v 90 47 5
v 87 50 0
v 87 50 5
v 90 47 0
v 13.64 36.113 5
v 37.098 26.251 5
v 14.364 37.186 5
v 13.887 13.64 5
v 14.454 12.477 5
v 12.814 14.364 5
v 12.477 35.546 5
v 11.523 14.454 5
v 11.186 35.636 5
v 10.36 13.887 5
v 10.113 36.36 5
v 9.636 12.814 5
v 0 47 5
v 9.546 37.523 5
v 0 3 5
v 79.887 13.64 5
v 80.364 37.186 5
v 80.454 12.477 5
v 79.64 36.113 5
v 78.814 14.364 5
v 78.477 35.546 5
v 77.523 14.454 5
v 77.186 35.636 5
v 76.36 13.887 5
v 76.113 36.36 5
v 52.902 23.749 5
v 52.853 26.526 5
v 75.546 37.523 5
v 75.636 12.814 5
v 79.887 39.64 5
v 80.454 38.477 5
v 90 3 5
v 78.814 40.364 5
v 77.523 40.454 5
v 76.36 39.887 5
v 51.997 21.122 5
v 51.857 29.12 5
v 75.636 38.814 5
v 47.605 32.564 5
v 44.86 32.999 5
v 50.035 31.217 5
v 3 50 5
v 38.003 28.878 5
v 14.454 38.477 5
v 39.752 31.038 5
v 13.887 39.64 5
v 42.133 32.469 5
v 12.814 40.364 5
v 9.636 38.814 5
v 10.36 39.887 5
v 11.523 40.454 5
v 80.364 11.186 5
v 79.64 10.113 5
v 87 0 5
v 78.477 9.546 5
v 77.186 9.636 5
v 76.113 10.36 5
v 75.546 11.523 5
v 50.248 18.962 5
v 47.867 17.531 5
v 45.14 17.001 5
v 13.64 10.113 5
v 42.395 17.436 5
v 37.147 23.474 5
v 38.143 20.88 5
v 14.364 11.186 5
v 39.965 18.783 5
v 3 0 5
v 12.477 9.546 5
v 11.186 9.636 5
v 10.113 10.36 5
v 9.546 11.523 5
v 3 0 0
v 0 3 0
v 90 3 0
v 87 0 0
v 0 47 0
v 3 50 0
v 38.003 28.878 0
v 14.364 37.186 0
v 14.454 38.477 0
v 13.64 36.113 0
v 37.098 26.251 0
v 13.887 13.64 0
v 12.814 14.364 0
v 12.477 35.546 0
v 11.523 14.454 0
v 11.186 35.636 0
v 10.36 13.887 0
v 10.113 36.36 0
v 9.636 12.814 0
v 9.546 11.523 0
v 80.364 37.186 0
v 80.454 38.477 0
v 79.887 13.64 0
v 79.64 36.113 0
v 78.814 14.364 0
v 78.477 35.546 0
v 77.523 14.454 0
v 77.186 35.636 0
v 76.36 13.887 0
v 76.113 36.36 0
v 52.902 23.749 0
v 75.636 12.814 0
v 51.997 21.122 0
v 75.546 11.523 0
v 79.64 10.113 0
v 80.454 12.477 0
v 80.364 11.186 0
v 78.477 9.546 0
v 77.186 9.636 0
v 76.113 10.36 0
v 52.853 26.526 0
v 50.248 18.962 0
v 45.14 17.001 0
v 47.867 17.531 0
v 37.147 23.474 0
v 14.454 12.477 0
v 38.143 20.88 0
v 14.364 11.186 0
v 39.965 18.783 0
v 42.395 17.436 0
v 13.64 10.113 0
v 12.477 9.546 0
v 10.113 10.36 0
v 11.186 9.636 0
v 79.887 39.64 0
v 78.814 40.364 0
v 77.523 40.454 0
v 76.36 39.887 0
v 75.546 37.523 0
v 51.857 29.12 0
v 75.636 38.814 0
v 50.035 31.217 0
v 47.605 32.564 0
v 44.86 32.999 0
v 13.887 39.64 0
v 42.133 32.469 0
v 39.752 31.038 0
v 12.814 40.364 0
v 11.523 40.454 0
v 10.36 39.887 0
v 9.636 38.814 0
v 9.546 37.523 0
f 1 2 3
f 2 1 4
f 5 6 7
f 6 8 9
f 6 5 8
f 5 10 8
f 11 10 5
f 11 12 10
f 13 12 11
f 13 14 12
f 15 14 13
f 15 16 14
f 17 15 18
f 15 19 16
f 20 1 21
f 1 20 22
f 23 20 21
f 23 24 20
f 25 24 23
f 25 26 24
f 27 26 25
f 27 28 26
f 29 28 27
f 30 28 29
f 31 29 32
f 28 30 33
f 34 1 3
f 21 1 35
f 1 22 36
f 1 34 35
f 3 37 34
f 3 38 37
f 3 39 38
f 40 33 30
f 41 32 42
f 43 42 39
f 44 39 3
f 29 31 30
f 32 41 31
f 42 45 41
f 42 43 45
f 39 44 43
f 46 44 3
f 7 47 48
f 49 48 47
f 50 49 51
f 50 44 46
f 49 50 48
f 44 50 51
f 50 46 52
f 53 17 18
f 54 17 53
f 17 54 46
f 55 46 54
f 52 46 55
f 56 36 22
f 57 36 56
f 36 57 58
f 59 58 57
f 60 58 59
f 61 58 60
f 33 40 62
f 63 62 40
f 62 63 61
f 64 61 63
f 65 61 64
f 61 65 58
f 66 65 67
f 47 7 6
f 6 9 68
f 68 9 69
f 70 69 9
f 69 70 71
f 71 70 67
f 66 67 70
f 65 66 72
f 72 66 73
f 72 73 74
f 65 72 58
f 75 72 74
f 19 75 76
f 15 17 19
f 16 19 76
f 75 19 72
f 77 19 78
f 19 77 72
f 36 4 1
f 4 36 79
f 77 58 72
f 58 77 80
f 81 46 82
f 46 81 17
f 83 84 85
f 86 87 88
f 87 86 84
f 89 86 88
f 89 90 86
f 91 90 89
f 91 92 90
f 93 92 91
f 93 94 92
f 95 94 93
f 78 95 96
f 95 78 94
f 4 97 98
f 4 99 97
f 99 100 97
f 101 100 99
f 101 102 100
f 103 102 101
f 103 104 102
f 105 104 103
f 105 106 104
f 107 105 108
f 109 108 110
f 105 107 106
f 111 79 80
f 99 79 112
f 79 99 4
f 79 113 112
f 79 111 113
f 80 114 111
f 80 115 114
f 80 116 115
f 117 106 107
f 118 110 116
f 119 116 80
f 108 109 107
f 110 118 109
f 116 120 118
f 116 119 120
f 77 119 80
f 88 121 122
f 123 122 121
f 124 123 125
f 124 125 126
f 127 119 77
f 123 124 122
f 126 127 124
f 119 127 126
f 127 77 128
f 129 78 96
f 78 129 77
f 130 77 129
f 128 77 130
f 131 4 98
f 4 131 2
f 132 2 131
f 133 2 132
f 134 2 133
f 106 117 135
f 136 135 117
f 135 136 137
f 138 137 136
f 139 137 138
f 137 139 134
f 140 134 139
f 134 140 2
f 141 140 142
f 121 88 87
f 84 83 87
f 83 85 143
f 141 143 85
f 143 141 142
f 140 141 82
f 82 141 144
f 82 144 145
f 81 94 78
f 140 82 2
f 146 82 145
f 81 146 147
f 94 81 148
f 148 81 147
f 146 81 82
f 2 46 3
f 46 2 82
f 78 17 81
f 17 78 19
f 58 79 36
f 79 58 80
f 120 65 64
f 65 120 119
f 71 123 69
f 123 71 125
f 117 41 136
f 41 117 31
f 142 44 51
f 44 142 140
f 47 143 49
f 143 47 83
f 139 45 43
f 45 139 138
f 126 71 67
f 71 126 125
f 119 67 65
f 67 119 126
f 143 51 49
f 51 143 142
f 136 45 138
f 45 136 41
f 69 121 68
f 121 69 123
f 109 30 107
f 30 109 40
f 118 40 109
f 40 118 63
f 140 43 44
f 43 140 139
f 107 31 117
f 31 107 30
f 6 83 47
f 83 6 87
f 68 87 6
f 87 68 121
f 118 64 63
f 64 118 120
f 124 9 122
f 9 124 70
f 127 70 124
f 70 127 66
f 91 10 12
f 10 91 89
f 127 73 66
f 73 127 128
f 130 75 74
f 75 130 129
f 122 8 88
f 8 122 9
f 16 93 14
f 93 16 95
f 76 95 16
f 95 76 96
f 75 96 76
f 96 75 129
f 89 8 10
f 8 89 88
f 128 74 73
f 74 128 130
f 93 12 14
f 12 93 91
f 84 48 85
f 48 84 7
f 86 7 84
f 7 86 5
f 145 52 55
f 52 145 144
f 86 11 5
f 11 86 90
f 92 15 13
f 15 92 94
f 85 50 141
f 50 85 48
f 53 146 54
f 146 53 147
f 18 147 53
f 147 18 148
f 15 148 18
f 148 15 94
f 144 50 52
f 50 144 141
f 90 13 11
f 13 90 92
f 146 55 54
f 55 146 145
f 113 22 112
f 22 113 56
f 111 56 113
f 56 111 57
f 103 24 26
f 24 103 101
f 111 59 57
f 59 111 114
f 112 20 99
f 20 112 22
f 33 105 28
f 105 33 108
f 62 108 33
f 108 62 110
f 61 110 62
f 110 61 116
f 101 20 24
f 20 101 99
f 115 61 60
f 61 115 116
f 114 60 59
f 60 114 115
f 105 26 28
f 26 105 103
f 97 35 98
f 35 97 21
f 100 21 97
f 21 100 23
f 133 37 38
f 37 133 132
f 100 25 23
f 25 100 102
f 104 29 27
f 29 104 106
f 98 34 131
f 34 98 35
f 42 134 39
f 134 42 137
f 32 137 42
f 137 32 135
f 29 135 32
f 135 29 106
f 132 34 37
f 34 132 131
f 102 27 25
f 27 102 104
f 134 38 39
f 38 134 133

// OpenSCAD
$fn = 32;

// ----------------------------------------------------------------------
// Spacer plate: rect 90 x 50
// ----------------------------------------------------------------------

// --- parameters (mm) ---
bore_r = 8;               // centre bore radius
bolt_r = 2.5;             // bolt hole radius
plate_t = 5;              // plate thickness, Z (extrusion height)
plate_l = 90;             // plate length, X
plate_w = 50;             // plate width, Y
inset = 12;               // corner hole inset
fit_tol = 0.02;           // declared fit tolerance (prompt contract)
free_tol = 0.2;           // declared free tolerance (prompt contract)

profile = [[3, 0], [87, 0], [90, 3], [90, 47], [87, 50], [3, 50], [0, 47], [0, 3]];  // primary outline, 8 points, counter clockwise
void_1 = [[52.853, 26.526], [51.857, 29.12], [50.035, 31.217], [47.605, 32.564], [44.86, 32.999], [42.133, 32.469], [39.752, 31.038], [38.003, 28.878], [37.098, 26.251], [37.147, 23.474], [38.143, 20.88], [39.965, 18.783], [42.395, 17.436], [45.14, 17.001], [47.867, 17.531], [50.248, 18.962], [51.997, 21.122], [52.902, 23.749]];  // centre bore, 18 points
void_2 = [[14.454, 12.477], [13.887, 13.64], [12.814, 14.364], [11.523, 14.454], [10.36, 13.887], [9.636, 12.814], [9.546, 11.523], [10.113, 10.36], [11.186, 9.636], [12.477, 9.546], [13.64, 10.113], [14.364, 11.186]];  // corner hole, 12 points
void_3 = [[14.454, 38.477], [13.887, 39.64], [12.814, 40.364], [11.523, 40.454], [10.36, 39.887], [9.636, 38.814], [9.546, 37.523], [10.113, 36.36], [11.186, 35.636], [12.477, 35.546], [13.64, 36.113], [14.364, 37.186]];  // corner hole, 12 points
void_4 = [[80.454, 12.477], [79.887, 13.64], [78.814, 14.364], [77.523, 14.454], [76.36, 13.887], [75.636, 12.814], [75.546, 11.523], [76.113, 10.36], [77.186, 9.636], [78.477, 9.546], [79.64, 10.113], [80.364, 11.186]];  // corner hole, 12 points
void_5 = [[80.454, 38.477], [79.887, 39.64], [78.814, 40.364], [77.523, 40.454], [76.36, 39.887], [75.636, 38.814], [75.546, 37.523], [76.113, 36.36], [77.186, 35.636], [78.477, 35.546], [79.64, 36.113], [80.364, 37.186]];  // corner hole, 12 points

// --- the one profile operation ---
difference() {
  linear_extrude(height = plate_t) polygon(points = profile);
  translate([0, 0, -1])
    linear_extrude(height = plate_t + 2) polygon(points = void_1);
  translate([0, 0, -1])
    linear_extrude(height = plate_t + 2) polygon(points = void_2);
  translate([0, 0, -1])
    linear_extrude(height = plate_t + 2) polygon(points = void_3);
  translate([0, 0, -1])
    linear_extrude(height = plate_t + 2) polygon(points = void_4);
  translate([0, 0, -1])
    linear_extrude(height = plate_t + 2) polygon(points = void_5);
}
